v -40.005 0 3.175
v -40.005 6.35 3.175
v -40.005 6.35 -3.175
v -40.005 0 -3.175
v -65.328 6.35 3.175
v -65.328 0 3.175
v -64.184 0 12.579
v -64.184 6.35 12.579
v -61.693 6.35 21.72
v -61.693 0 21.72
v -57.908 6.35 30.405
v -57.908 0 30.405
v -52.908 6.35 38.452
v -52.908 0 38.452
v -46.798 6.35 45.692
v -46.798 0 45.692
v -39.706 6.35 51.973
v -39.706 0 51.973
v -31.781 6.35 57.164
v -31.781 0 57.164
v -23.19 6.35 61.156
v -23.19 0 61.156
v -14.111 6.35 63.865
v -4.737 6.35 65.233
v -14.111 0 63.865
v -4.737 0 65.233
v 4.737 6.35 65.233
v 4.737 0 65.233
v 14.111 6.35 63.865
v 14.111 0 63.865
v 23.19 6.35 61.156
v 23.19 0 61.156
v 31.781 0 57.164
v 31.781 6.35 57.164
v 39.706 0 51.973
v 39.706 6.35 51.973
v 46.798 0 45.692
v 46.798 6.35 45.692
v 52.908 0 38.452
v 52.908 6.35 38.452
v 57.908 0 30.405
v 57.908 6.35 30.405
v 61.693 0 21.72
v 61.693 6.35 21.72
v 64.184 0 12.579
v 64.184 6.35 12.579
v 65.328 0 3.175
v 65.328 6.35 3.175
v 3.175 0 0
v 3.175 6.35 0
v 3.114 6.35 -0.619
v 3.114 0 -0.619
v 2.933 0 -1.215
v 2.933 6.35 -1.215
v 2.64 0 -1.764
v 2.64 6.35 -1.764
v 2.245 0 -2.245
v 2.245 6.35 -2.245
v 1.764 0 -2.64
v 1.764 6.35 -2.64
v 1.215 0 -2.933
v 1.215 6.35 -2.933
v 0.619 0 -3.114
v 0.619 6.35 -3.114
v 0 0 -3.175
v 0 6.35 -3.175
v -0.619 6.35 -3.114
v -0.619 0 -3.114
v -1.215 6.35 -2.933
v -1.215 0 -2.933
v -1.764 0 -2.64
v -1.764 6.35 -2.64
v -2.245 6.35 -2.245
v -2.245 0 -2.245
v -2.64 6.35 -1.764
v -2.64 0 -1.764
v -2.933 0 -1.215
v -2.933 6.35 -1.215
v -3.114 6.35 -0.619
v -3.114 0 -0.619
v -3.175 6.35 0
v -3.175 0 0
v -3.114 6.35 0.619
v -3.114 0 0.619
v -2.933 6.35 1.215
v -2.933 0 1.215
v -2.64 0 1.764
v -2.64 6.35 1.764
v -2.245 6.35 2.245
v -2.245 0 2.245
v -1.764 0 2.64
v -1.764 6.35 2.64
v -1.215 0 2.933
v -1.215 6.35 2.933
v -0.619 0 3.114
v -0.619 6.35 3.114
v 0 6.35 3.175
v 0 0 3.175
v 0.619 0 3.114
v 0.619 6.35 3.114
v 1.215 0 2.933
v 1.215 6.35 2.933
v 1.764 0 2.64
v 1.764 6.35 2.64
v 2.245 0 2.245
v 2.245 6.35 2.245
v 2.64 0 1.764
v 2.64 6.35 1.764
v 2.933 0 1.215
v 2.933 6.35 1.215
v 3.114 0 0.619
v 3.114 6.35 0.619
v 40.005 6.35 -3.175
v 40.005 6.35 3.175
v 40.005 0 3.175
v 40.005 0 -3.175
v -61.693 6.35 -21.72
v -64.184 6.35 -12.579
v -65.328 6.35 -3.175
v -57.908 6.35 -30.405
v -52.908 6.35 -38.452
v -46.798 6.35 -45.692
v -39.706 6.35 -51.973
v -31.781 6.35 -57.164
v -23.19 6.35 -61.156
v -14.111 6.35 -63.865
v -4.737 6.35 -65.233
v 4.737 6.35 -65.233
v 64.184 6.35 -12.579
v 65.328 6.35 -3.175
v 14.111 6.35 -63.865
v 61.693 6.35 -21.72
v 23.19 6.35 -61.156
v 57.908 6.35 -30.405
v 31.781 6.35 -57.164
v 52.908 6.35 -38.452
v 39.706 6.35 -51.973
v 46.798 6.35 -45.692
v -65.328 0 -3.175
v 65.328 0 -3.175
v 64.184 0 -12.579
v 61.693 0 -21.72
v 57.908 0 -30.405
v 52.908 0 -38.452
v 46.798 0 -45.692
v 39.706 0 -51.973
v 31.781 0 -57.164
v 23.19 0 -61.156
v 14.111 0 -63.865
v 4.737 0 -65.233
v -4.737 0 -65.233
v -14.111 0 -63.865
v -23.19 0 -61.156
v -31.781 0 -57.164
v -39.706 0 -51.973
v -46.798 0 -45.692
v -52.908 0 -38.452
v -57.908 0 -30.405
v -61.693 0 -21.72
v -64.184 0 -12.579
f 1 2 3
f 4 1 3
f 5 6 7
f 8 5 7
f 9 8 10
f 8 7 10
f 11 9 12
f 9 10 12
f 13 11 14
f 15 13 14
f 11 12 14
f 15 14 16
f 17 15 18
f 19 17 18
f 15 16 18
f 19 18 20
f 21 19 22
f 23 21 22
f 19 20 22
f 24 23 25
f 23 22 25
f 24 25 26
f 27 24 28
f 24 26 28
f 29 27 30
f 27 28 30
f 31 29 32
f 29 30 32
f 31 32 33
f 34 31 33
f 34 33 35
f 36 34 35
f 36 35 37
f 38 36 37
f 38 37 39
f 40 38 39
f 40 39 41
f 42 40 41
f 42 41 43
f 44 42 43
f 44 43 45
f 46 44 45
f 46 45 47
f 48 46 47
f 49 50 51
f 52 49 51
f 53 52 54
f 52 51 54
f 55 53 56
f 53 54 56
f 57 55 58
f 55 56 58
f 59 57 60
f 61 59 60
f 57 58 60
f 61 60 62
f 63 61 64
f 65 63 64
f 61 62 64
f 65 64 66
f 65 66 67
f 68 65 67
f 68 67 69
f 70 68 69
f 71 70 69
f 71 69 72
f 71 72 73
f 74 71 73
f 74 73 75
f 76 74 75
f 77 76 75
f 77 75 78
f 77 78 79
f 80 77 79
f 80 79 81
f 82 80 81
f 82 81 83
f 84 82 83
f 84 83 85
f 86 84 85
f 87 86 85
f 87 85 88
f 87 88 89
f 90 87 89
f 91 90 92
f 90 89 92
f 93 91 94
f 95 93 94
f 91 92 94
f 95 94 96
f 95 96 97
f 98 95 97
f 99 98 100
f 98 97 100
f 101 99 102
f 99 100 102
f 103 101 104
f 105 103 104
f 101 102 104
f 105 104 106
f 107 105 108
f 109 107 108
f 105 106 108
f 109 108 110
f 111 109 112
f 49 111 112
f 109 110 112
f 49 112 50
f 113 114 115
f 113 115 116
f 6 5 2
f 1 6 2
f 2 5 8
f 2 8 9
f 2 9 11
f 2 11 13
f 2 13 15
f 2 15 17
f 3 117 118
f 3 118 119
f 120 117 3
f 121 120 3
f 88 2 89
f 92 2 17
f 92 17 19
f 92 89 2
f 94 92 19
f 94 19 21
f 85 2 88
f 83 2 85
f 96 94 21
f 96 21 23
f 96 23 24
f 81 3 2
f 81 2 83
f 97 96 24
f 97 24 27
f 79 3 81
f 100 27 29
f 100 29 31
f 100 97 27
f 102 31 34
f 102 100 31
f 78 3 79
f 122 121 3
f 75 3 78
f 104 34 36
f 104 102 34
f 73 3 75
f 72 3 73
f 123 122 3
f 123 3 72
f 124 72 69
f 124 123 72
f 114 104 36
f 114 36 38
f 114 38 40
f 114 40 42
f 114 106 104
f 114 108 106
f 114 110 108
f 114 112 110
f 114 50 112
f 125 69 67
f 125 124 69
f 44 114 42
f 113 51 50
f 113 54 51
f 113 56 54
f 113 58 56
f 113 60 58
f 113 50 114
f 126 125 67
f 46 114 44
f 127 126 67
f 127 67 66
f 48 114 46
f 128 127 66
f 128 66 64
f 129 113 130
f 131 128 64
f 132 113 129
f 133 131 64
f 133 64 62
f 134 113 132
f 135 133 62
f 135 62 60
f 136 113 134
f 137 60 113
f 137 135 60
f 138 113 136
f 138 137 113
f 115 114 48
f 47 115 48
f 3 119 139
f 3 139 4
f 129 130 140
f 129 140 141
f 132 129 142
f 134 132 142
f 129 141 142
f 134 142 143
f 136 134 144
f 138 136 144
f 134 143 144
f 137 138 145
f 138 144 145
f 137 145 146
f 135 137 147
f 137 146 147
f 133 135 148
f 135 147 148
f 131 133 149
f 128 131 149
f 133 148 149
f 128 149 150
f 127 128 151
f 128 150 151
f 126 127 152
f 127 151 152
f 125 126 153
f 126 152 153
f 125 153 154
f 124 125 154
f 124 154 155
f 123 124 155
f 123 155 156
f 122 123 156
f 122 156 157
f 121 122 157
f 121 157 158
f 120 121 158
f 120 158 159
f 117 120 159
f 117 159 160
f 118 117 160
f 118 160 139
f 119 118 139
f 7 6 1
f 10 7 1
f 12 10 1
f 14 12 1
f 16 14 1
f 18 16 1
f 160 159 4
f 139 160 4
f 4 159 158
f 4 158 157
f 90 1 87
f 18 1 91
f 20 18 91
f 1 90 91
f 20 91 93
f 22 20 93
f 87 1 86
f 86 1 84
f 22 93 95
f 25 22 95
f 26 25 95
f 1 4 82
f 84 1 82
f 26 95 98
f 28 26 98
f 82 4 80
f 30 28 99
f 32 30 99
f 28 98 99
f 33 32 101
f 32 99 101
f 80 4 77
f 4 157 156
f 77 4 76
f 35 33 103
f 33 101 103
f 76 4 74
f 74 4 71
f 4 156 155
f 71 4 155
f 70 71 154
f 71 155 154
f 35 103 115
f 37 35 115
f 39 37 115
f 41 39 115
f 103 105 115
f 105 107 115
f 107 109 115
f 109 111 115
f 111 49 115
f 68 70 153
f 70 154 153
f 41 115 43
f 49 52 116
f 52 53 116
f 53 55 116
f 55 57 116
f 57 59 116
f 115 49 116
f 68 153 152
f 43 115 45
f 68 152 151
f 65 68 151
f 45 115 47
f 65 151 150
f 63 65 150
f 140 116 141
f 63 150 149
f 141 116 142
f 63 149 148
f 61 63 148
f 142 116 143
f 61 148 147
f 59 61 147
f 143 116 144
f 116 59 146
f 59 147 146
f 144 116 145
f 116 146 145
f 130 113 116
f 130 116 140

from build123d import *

# Parameters (mm, degrees)
SKETCH1_R           = 65.405
BOSS_EXTRUDE1_DEPTH = 6.35
SKETCH2_W           = 50.8
SKETCH2_H           = 6.35
CUT_EXTRUDE1_DEPTH  = 6.35
SKETCH7_R           = 3.175
CUT_EXTRUDE2_DEPTH  = 7.35


with BuildPart() as part:
    # Sketch1 → Boss-Extrude1 (new body)
    with BuildSketch(Plane(origin=(0, 0, 0), x_dir=(1, 0, 0), z_dir=(0, 1, 0))):
        Circle(SKETCH1_R)
    extrude(amount=BOSS_EXTRUDE1_DEPTH)

    # Sketch2 → Cut-Extrude1 (cut)
    with BuildSketch(Plane(origin=(0, 6.35, 0), x_dir=(1, 0, 0), z_dir=(0, 1, 0))):
        with Locations((-65.405, 0)):
            Rectangle(SKETCH2_W, SKETCH2_H)
        with Locations((65.405, 0)):
            Rectangle(SKETCH2_W, SKETCH2_H)
    extrude(amount=-CUT_EXTRUDE1_DEPTH, mode=Mode.SUBTRACT)

    # Sketch7 → Cut-Extrude2 (cut, through all)
    with BuildSketch(Plane(origin=(0, 6.35, 0), x_dir=(1, 0, 0), z_dir=(0, 1, 0))):
        Circle(SKETCH7_R)
    extrude(amount=-CUT_EXTRUDE2_DEPTH, mode=Mode.SUBTRACT)


solid = part.part
